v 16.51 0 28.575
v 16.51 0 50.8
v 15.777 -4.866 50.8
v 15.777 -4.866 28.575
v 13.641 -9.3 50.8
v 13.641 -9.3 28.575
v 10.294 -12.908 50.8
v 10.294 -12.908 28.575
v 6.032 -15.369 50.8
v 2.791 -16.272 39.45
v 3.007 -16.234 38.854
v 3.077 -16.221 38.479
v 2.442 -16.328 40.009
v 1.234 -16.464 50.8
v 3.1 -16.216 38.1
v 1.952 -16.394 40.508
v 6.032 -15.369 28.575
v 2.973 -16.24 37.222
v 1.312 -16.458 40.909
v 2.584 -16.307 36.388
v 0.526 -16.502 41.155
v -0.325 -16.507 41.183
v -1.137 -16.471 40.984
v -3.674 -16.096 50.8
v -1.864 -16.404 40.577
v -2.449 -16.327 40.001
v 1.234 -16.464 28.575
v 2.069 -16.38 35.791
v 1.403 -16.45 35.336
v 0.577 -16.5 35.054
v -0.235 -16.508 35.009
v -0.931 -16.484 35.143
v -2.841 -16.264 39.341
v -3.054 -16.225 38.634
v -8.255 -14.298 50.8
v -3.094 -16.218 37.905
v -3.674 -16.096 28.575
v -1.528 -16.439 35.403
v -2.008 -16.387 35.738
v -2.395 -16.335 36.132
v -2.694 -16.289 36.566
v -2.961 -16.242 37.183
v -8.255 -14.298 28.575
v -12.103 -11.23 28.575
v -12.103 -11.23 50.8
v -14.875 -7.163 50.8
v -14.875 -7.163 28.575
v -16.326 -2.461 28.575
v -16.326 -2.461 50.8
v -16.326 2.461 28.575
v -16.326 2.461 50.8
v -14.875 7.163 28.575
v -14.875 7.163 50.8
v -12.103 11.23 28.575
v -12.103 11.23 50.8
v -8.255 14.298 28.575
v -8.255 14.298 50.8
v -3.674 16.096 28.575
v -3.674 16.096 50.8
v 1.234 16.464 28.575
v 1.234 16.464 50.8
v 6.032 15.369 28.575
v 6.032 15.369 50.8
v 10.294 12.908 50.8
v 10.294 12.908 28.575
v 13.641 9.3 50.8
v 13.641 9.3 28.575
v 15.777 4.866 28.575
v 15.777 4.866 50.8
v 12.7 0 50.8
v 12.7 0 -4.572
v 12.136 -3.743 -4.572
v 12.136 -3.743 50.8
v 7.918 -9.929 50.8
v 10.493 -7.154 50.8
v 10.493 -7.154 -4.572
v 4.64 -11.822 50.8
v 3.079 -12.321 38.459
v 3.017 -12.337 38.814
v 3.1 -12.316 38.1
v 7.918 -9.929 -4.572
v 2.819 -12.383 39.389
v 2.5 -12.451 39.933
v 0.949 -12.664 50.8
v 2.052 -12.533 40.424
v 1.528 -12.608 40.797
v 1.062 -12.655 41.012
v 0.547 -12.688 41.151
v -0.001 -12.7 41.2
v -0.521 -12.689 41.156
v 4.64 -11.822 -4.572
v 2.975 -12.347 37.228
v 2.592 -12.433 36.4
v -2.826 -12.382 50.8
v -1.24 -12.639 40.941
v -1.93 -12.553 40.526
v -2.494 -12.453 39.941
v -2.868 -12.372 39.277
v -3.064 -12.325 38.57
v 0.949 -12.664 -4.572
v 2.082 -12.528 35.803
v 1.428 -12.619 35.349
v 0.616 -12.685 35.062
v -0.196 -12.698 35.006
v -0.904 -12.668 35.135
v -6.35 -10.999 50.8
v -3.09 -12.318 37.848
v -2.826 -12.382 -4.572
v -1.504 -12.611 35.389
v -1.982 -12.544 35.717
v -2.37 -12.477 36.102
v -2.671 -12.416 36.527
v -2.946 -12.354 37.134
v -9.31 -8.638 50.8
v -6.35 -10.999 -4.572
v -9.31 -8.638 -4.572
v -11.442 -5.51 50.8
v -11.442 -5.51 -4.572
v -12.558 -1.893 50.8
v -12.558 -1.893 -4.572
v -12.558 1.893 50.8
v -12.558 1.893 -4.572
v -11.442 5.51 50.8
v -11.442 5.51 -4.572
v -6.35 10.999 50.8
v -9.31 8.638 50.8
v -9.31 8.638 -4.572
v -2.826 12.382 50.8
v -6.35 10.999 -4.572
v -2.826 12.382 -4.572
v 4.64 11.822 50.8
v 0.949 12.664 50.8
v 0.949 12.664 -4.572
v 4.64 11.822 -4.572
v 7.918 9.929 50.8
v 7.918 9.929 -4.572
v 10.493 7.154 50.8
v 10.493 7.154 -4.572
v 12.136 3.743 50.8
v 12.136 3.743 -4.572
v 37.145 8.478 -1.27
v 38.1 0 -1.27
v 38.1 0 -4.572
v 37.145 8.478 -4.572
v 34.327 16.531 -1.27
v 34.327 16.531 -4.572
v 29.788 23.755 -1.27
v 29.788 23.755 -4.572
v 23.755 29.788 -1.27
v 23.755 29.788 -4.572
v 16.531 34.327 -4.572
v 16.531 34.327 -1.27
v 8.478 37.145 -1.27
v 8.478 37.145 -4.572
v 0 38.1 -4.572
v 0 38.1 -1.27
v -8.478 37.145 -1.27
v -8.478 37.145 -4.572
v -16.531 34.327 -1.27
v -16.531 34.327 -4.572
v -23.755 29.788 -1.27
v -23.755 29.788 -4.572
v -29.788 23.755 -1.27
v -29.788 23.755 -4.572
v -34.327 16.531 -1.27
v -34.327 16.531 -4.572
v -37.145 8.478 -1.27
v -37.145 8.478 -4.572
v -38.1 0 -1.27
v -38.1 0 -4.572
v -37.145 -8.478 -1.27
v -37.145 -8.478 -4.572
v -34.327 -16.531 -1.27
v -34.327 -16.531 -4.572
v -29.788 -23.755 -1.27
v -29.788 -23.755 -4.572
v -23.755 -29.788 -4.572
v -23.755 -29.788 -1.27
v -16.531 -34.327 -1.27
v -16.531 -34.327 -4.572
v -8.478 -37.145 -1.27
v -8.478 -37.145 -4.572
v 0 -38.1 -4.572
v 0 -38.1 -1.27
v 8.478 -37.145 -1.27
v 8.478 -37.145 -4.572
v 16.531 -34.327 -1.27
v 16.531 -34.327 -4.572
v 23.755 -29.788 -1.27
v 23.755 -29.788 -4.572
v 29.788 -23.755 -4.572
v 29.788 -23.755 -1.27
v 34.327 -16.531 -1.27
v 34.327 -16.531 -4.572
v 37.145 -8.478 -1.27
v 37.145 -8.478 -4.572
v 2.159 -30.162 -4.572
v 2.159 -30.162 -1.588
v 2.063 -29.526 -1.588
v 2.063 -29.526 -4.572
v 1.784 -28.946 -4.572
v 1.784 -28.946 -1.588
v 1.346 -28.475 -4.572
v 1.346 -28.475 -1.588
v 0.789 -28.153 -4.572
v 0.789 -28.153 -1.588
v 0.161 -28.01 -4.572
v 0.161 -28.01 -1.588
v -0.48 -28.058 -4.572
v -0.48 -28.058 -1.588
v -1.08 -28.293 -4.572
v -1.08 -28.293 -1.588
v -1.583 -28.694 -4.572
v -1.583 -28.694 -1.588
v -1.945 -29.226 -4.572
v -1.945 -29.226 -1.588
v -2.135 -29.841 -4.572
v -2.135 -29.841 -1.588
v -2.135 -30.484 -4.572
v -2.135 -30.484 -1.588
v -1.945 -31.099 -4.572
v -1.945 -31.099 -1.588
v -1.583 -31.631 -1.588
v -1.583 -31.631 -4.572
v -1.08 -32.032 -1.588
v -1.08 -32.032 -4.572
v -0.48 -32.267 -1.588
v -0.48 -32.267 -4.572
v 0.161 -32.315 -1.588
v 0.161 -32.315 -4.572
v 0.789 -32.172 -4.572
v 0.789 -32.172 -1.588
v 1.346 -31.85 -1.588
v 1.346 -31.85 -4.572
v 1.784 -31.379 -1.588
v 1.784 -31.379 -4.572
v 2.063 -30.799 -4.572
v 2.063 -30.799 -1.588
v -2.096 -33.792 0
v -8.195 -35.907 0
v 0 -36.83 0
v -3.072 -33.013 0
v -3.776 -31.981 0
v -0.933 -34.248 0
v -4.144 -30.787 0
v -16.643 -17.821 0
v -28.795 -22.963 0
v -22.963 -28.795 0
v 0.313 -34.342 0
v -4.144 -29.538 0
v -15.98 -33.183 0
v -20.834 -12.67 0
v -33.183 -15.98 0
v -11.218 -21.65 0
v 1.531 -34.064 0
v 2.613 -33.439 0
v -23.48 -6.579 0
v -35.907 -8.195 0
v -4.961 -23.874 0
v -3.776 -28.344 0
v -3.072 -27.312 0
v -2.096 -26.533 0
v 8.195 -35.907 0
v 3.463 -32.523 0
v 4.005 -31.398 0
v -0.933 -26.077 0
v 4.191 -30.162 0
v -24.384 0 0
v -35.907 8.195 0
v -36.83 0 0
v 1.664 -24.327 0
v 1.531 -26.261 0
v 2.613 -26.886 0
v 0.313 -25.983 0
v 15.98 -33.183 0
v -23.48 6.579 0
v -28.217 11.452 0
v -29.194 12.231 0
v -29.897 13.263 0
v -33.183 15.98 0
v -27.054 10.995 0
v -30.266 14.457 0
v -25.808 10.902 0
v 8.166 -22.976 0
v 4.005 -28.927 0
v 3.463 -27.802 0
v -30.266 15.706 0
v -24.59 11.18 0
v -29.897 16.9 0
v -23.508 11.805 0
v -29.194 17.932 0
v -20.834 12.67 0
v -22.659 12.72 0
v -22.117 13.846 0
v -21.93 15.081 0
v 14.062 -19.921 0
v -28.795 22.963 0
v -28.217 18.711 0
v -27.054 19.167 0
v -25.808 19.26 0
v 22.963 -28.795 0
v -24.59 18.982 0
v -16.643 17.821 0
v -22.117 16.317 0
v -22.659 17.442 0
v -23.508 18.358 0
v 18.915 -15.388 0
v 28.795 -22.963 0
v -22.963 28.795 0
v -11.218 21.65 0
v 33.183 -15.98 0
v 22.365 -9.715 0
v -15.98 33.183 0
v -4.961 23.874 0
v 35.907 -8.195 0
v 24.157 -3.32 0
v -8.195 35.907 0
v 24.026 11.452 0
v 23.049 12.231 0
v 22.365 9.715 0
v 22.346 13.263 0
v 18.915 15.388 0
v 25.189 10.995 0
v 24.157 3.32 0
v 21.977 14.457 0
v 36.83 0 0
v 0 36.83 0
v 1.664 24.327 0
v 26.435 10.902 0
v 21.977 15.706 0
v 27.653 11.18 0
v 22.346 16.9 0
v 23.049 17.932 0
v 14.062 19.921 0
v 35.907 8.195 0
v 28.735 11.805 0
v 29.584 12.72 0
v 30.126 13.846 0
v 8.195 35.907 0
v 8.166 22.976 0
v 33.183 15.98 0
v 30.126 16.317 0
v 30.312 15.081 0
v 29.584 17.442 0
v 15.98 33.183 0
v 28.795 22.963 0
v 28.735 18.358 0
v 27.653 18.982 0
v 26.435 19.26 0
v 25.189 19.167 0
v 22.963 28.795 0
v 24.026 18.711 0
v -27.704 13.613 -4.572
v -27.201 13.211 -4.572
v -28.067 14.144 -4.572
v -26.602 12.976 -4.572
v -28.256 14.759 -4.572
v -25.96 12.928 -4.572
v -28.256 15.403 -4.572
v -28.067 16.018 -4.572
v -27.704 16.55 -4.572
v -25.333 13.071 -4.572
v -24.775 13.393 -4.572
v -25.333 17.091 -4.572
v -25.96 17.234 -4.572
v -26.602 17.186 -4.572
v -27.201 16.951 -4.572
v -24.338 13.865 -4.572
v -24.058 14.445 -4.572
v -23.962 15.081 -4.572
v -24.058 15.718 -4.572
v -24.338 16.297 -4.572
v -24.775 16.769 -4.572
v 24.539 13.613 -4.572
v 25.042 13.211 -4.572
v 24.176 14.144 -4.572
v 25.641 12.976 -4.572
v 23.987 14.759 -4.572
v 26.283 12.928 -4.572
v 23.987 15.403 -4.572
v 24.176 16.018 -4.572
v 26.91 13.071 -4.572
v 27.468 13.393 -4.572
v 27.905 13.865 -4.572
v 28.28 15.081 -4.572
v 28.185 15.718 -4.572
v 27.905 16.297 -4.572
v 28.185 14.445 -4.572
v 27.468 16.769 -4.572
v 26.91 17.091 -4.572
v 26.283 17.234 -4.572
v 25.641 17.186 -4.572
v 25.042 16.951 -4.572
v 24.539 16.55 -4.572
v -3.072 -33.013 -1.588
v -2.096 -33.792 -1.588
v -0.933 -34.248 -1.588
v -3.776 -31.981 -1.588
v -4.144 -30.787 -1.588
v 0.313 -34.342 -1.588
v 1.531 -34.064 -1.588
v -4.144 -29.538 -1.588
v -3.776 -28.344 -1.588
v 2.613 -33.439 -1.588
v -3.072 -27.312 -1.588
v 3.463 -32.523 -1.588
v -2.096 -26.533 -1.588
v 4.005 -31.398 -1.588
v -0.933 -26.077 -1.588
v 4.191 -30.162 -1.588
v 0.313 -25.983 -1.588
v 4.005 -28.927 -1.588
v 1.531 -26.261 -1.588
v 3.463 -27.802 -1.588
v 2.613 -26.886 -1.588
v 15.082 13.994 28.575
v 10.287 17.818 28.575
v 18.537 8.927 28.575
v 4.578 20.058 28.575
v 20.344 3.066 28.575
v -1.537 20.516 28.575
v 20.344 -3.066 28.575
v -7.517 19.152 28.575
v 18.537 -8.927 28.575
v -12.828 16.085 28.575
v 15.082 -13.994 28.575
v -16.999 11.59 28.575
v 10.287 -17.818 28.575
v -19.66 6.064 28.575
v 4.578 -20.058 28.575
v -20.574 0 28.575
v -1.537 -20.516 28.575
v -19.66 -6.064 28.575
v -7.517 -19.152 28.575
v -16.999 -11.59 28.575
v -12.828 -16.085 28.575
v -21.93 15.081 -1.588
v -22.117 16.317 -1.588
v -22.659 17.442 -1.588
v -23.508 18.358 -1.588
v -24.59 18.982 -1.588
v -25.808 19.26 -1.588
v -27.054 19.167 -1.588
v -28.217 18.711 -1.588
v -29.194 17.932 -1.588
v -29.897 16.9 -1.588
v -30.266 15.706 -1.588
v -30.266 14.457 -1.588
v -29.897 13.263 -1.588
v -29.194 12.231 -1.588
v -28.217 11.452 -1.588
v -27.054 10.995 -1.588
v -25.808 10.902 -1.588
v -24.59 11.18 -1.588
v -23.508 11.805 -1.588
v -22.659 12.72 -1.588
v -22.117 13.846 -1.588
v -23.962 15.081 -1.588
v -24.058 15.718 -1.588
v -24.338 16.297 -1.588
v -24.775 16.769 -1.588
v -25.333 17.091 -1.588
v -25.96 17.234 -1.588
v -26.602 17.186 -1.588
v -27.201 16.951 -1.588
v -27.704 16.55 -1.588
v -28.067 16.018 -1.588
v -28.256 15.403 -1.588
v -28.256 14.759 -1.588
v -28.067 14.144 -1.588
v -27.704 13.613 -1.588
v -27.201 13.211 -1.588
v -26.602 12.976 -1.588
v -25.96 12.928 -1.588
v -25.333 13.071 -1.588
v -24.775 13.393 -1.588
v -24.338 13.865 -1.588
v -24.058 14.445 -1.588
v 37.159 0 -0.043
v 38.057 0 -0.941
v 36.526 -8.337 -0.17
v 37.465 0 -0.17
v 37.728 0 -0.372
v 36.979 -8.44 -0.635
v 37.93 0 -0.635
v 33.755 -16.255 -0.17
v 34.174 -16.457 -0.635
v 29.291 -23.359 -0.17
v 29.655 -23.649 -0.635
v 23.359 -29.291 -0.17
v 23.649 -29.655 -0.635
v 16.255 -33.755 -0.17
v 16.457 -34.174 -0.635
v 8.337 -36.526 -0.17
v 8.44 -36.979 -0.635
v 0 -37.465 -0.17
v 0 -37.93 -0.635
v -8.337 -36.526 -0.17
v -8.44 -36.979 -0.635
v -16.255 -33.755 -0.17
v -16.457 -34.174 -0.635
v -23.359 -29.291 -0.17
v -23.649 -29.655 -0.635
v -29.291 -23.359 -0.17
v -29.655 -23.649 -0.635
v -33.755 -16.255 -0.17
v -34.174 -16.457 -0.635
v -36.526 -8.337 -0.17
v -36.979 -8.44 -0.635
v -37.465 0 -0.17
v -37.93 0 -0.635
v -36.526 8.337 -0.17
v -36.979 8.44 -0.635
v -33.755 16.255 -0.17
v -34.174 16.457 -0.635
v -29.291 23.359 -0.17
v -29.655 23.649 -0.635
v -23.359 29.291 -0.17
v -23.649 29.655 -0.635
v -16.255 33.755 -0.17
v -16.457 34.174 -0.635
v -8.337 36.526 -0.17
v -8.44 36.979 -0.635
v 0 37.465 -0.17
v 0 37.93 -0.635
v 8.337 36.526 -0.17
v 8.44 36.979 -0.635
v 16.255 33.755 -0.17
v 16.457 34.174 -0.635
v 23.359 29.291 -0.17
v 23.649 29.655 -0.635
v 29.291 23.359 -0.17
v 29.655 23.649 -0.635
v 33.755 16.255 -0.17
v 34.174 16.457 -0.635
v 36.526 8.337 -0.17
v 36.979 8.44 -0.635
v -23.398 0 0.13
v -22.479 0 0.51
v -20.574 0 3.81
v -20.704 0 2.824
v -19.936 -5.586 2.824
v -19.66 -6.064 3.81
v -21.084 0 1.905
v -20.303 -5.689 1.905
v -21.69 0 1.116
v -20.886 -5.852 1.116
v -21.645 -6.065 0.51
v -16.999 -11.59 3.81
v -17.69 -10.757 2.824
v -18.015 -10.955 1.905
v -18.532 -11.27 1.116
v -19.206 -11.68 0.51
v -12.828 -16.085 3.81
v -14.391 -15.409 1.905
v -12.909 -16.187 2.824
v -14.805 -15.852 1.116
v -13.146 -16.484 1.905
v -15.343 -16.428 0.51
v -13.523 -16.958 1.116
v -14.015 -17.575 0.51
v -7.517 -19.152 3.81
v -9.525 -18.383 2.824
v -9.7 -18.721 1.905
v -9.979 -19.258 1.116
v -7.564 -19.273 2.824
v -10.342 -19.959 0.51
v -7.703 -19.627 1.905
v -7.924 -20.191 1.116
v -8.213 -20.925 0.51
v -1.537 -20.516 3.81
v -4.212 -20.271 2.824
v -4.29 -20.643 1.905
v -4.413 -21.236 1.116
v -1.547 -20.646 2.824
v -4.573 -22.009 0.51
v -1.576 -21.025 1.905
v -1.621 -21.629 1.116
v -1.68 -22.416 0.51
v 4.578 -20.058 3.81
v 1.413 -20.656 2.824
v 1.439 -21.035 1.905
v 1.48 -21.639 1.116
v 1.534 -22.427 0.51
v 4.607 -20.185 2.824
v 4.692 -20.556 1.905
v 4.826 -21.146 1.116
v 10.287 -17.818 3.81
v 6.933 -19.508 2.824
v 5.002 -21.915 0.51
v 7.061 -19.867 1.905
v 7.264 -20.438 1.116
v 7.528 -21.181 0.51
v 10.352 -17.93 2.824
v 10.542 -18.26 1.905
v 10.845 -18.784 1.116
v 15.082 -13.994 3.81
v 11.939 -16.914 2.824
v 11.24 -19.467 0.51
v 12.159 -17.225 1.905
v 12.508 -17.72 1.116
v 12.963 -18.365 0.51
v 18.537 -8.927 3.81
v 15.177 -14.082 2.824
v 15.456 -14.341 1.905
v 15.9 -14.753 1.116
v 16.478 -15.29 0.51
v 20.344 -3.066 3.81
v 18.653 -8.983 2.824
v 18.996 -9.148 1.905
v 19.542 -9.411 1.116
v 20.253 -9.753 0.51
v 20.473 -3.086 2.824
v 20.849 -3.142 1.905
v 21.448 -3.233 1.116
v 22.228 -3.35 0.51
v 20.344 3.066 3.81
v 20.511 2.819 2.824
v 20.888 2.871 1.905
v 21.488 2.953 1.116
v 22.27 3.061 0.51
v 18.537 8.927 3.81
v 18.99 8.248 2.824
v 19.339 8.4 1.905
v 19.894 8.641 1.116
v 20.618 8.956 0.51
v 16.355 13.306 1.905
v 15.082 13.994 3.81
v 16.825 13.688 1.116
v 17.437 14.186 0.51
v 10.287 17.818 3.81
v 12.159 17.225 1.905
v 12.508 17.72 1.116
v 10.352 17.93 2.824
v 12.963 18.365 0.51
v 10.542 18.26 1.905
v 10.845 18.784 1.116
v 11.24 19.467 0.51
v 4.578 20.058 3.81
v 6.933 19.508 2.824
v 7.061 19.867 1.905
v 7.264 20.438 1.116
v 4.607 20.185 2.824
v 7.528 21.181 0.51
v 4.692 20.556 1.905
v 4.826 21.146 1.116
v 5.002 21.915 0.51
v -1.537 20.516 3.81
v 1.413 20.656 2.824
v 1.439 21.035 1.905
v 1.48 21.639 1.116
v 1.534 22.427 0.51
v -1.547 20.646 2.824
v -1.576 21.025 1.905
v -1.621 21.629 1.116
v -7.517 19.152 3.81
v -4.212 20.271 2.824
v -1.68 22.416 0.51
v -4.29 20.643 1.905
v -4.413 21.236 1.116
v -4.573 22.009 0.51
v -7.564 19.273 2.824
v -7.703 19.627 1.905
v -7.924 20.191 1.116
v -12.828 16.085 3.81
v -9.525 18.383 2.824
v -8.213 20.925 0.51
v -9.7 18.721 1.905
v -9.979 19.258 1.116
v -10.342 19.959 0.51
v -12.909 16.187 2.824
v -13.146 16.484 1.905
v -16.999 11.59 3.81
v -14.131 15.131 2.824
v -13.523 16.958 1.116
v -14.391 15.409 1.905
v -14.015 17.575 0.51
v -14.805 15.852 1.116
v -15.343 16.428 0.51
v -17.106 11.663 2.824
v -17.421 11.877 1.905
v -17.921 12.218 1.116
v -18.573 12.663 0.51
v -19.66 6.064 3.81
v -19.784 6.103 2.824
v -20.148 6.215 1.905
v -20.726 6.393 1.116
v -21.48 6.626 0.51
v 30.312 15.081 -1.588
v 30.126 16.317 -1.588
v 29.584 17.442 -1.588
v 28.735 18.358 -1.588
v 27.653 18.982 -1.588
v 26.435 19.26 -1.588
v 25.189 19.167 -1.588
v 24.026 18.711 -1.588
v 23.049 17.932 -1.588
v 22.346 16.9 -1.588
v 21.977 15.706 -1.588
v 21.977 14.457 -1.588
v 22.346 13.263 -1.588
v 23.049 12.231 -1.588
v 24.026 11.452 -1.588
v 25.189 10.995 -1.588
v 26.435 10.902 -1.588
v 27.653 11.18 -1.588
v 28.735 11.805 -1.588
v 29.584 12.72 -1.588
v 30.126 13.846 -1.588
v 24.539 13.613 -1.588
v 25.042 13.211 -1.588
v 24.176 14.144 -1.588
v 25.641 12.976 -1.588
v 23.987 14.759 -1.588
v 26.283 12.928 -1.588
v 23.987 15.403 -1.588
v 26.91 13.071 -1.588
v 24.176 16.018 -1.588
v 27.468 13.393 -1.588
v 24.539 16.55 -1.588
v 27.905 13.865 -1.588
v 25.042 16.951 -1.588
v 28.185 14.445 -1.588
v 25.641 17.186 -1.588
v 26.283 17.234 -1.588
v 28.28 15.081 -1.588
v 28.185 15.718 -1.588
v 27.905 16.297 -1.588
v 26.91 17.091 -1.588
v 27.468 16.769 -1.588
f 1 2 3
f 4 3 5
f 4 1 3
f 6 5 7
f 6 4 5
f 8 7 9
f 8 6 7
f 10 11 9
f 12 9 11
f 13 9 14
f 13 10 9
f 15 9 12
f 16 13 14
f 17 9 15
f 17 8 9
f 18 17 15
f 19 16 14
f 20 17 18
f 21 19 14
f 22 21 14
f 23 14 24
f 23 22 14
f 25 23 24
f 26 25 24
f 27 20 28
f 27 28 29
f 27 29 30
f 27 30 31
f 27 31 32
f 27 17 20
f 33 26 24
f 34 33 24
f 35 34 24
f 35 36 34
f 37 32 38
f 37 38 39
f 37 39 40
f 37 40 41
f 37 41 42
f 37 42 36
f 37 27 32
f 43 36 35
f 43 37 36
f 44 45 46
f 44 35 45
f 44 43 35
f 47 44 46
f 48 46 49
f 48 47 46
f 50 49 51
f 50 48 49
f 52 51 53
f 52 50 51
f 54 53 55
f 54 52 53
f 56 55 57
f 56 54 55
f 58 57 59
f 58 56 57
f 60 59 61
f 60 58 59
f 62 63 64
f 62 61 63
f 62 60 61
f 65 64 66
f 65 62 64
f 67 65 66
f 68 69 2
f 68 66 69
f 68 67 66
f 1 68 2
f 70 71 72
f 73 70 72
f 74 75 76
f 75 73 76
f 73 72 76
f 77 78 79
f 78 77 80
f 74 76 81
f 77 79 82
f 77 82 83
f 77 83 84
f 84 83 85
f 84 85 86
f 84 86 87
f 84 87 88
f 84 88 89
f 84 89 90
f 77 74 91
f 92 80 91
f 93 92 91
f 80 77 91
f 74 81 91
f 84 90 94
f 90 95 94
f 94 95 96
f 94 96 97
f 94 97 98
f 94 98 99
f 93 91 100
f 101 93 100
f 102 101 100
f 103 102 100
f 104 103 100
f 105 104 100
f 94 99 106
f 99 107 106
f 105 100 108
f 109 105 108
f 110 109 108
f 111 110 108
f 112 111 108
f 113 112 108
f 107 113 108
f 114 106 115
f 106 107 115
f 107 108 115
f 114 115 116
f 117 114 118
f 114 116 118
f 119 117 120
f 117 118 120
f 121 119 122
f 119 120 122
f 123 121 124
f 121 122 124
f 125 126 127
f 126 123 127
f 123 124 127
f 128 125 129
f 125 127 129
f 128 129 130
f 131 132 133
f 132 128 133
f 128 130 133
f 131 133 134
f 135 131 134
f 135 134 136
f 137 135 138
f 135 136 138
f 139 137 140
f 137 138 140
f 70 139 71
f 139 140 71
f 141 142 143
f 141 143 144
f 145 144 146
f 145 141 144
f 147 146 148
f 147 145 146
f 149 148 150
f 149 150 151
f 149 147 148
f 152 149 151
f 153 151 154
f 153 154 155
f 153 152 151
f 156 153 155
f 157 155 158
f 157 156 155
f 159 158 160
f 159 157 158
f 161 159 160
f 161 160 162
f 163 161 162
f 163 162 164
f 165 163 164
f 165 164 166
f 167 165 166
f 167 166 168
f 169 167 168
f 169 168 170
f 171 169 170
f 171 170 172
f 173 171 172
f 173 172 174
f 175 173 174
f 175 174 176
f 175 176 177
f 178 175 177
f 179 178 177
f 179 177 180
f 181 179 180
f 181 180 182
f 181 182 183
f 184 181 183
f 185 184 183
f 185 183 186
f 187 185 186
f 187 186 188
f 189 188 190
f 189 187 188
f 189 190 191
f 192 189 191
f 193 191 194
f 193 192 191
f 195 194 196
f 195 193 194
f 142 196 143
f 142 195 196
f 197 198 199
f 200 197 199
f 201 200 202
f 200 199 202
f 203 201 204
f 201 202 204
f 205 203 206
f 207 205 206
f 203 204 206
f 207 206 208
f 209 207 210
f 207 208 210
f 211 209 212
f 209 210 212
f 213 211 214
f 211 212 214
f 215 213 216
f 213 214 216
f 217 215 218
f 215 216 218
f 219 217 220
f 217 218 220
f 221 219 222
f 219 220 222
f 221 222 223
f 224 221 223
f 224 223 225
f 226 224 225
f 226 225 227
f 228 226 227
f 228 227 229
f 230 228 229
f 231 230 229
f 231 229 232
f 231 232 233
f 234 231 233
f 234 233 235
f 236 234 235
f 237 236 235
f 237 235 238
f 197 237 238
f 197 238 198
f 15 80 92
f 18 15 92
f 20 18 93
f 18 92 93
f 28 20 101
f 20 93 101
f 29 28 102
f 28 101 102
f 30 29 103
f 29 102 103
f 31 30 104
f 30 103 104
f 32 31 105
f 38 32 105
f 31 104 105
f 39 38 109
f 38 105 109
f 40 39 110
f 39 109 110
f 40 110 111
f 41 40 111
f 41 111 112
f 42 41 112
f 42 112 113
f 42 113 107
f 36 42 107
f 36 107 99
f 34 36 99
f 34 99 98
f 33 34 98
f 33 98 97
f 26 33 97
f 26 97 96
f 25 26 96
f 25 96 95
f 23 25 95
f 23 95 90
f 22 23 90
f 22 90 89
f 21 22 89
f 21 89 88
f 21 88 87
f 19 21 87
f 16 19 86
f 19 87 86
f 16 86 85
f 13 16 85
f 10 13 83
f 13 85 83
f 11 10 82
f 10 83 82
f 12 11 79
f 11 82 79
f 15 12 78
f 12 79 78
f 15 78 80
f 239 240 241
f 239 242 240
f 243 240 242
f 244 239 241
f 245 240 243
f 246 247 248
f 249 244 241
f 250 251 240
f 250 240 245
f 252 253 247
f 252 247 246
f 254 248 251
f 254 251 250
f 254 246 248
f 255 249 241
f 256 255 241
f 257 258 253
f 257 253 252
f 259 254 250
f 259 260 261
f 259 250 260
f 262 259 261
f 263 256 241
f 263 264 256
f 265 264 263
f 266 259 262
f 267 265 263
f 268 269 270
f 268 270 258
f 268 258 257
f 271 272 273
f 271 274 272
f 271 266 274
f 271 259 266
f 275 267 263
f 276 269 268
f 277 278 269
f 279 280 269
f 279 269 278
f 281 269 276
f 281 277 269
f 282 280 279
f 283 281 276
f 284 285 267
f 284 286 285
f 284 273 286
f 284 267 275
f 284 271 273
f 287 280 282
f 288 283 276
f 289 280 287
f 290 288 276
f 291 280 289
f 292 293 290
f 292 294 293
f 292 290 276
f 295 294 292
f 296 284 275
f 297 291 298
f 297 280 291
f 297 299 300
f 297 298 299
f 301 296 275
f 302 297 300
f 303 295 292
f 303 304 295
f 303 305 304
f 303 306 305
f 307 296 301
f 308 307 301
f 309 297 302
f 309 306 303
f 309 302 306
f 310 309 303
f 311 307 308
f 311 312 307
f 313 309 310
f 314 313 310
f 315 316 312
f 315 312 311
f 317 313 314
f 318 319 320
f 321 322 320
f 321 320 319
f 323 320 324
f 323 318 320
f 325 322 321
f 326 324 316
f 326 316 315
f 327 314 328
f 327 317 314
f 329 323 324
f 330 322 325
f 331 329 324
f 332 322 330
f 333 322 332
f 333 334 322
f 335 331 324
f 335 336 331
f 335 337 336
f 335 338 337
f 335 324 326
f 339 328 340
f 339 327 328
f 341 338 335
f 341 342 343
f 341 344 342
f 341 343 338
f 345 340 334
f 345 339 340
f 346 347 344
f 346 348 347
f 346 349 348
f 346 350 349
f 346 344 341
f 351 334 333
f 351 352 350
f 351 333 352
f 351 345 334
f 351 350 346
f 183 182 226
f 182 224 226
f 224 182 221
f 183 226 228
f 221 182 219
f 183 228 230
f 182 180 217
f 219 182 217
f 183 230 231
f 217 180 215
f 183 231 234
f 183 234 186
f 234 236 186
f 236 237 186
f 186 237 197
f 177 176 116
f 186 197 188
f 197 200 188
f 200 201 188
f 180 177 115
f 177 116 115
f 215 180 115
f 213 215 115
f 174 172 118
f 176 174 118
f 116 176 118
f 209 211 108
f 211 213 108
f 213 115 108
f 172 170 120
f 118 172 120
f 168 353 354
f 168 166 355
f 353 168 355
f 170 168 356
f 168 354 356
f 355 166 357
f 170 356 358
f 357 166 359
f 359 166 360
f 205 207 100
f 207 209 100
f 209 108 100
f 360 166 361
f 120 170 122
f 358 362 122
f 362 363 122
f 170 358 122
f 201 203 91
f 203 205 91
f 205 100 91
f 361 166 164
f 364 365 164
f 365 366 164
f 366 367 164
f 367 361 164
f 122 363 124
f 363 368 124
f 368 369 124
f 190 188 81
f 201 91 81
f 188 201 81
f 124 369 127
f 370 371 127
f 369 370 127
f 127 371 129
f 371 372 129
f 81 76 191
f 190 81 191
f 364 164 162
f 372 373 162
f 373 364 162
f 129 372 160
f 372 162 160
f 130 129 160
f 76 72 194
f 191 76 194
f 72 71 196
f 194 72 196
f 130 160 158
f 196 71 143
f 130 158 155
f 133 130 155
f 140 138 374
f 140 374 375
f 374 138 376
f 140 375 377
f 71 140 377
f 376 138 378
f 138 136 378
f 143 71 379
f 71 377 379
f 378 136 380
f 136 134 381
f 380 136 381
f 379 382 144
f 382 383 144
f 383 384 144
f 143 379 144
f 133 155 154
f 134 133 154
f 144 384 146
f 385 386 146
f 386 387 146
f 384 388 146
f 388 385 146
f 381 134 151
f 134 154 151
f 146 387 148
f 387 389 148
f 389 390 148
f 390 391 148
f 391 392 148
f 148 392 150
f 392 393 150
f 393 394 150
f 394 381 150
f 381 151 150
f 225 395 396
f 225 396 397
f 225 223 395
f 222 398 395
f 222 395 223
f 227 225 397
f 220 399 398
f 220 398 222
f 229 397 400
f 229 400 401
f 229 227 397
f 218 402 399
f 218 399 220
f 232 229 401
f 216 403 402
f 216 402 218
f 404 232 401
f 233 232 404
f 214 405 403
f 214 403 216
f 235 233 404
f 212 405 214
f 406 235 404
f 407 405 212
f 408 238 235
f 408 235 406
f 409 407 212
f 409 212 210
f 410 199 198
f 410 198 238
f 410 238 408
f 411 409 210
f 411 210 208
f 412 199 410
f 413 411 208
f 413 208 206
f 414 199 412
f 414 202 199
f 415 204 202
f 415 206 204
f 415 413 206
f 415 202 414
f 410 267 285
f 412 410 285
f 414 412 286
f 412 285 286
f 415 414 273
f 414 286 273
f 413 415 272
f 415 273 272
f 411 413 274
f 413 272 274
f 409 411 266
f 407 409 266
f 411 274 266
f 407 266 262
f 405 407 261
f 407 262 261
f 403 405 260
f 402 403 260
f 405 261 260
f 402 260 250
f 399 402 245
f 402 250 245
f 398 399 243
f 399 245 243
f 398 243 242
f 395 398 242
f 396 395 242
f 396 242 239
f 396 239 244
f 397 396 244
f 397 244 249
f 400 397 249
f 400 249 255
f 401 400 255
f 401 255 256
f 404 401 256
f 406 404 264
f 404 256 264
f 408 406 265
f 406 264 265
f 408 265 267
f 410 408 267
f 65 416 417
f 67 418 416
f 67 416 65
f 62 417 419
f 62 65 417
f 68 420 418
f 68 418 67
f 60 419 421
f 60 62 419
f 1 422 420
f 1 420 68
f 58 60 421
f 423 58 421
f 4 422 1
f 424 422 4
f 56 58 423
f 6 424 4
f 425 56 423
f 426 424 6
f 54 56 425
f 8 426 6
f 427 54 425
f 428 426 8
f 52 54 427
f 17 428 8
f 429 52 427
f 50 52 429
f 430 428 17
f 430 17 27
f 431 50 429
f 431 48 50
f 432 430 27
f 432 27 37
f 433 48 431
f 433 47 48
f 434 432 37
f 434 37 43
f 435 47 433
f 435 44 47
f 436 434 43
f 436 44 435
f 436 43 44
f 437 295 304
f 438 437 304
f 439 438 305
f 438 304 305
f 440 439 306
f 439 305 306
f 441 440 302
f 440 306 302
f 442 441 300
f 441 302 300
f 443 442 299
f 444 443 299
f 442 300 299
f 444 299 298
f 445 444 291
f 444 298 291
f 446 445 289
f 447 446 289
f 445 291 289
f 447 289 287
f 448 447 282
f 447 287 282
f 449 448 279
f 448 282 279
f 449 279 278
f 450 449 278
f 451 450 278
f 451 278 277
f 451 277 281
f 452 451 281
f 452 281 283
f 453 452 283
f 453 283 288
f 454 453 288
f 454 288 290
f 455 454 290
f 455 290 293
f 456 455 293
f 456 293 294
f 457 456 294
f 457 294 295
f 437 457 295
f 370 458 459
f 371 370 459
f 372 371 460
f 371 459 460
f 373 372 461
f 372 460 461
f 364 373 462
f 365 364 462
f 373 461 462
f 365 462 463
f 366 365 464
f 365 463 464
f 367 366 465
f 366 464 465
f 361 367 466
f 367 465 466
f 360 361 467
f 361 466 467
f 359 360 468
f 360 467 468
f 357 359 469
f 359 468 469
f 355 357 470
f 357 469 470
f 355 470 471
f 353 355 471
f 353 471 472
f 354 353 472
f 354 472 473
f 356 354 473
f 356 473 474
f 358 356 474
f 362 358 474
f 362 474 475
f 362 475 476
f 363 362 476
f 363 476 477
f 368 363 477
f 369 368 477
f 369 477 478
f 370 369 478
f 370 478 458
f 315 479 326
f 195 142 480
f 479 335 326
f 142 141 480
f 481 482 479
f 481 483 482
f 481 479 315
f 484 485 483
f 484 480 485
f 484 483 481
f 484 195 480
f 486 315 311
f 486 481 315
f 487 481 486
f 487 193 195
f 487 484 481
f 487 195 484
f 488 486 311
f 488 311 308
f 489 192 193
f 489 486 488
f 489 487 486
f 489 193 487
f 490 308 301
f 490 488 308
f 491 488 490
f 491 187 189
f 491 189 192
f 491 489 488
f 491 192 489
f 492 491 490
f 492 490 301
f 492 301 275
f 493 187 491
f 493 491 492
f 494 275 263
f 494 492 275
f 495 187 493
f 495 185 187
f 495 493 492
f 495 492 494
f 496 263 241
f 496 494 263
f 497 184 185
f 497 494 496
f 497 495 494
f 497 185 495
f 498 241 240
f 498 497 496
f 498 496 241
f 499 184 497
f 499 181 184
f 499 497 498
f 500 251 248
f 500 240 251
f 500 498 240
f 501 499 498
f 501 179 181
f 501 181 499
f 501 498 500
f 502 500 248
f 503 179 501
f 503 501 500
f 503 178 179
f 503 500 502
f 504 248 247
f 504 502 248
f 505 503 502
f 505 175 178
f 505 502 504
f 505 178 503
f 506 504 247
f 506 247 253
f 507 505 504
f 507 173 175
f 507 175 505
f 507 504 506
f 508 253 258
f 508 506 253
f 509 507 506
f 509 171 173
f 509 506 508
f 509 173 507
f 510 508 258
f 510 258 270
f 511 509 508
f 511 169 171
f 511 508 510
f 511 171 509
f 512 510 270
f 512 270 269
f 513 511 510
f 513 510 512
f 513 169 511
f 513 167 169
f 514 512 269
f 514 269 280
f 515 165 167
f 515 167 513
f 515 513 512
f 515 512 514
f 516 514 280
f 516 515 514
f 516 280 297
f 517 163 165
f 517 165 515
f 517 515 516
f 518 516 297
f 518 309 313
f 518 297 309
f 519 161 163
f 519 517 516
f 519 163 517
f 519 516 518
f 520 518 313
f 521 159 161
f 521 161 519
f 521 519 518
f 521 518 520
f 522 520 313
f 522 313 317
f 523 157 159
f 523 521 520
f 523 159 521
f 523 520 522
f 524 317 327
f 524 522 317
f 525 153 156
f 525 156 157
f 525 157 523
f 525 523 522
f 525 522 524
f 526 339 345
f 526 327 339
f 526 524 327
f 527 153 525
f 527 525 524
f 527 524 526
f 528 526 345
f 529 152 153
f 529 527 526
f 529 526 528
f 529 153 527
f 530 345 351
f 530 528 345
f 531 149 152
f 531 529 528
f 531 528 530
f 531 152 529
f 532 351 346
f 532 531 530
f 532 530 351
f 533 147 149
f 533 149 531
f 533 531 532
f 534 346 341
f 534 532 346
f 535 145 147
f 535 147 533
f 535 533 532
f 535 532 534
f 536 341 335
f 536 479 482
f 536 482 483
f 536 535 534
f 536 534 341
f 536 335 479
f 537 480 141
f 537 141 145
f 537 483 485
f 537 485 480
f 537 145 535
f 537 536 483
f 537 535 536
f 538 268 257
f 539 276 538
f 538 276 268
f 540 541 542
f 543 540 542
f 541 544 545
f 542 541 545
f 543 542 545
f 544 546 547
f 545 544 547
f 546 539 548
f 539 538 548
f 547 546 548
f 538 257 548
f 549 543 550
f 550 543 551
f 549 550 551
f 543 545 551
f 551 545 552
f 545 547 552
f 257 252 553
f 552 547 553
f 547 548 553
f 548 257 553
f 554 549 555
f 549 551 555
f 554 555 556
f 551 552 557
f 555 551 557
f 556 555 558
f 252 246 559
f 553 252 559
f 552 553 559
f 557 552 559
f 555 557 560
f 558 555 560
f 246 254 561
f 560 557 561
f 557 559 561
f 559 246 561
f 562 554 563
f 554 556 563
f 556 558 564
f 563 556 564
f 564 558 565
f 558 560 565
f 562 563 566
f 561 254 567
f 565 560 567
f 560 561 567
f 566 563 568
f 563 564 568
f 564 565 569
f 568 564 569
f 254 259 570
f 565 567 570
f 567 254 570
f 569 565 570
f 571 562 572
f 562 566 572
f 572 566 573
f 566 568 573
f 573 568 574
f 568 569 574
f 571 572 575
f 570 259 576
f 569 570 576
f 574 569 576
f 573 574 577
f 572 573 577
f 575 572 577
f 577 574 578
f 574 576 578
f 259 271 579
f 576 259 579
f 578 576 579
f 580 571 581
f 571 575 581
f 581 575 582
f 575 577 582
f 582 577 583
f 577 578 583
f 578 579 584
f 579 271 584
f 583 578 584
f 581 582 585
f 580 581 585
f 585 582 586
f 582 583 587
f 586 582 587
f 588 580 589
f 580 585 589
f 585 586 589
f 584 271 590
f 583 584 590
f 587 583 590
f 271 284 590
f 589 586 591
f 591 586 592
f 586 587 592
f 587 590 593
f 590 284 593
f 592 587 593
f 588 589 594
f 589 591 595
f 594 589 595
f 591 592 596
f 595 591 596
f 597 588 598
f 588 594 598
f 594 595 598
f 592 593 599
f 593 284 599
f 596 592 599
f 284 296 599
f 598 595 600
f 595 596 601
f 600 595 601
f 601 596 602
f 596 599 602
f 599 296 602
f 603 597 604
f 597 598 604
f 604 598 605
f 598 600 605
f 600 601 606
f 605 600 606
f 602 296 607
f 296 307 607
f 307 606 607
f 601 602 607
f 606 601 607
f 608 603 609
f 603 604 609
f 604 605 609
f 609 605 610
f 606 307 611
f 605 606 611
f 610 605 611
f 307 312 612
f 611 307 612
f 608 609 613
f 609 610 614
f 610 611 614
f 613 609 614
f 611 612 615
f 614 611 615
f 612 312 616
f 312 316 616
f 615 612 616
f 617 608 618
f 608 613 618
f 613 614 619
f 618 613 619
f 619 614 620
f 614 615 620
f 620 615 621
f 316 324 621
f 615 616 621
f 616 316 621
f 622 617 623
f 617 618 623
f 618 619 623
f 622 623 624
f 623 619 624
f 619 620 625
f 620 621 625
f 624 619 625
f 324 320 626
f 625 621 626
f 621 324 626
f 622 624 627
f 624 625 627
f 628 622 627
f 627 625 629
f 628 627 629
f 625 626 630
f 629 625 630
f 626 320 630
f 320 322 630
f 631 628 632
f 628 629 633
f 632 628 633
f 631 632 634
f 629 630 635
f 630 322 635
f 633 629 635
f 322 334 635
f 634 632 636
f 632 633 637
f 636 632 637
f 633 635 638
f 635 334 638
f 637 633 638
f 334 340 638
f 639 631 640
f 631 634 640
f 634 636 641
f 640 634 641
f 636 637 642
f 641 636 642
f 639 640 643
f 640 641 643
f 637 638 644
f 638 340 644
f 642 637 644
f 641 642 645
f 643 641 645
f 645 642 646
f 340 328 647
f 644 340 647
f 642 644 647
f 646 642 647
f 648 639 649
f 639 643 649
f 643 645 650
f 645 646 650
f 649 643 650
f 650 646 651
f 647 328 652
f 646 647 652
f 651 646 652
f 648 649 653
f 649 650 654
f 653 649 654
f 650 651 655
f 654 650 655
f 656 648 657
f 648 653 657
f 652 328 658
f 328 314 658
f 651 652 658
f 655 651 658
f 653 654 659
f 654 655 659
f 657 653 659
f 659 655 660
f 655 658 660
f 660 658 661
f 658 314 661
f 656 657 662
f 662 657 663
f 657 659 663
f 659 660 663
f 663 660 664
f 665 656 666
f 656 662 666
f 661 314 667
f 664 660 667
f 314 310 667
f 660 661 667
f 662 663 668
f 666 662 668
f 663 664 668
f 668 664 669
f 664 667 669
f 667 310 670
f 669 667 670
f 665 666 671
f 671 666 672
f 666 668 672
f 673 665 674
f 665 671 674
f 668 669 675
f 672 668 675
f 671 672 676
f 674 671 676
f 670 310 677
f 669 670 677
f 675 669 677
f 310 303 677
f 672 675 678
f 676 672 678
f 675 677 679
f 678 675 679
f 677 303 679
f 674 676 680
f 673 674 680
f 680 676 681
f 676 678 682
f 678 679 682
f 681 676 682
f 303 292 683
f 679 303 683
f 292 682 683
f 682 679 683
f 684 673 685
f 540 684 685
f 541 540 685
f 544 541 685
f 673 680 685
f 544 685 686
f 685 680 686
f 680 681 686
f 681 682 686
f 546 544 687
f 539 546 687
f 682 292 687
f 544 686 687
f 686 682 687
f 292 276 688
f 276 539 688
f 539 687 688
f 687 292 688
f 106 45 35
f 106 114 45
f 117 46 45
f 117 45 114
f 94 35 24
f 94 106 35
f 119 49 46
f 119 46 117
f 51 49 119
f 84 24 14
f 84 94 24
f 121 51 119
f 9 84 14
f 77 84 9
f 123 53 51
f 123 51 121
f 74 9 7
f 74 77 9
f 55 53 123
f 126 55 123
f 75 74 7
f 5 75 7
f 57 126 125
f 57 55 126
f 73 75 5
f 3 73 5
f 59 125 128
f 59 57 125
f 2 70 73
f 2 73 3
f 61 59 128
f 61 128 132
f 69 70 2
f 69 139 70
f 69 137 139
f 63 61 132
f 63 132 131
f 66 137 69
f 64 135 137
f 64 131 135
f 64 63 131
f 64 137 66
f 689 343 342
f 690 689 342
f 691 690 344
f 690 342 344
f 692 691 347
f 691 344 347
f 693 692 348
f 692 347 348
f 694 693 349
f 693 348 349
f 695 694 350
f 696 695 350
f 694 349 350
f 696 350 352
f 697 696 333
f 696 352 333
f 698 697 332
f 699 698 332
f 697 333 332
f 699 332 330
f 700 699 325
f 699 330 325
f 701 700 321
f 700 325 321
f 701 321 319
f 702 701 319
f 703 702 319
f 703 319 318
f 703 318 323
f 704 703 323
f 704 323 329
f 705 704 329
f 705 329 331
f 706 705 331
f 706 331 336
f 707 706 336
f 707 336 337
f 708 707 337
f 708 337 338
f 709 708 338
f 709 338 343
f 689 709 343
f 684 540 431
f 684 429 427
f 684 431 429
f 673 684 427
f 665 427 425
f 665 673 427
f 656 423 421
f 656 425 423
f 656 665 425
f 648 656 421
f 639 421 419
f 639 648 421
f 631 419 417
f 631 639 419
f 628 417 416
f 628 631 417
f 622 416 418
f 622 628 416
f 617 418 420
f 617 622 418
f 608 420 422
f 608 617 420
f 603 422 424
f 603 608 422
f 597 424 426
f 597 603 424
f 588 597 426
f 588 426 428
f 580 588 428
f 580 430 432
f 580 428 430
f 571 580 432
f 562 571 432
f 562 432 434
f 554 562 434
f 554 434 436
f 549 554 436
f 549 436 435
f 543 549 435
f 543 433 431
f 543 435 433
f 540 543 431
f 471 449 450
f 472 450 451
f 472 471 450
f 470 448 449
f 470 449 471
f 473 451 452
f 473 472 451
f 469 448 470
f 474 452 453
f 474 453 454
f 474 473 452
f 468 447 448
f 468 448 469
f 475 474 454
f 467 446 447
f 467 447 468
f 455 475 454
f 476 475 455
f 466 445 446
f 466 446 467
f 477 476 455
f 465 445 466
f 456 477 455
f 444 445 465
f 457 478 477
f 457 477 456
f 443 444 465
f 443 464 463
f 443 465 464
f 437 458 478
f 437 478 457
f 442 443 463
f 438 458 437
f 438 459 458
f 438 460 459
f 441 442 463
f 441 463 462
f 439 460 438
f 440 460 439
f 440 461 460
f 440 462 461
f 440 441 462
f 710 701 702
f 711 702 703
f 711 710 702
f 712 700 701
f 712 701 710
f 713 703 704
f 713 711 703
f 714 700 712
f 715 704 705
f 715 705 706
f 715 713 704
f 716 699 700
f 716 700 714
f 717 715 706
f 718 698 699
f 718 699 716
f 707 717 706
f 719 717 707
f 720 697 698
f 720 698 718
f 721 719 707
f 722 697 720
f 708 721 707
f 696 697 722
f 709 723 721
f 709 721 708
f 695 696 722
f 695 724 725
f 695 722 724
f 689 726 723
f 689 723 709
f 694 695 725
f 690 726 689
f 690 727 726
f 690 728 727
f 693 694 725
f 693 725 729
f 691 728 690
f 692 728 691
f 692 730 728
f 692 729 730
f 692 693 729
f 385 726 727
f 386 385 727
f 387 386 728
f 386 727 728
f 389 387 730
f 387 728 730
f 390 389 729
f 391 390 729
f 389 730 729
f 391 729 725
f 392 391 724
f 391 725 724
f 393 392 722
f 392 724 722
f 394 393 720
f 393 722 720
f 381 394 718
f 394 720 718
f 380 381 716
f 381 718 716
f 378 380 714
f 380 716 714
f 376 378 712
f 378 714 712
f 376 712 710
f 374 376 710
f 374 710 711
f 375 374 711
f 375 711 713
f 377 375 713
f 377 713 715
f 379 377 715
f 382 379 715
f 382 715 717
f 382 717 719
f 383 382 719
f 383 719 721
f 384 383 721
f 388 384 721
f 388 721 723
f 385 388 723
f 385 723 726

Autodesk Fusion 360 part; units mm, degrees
sketch "Sketch1" plane through (0, 0, 0) normal (0, 0, 1) x (1, 0, 0)
  circle A0 centre (0, 0) radius 16.51
  circle A1 centre (0, 0) radius 12.7
  circle A2 centre (0, 0) radius 38.1
  dimension "d1" = 33.02
  dimension "d2" = 25.4
  dimension "d3" = 76.2
extrude "Extrude1" add sketch "Sketch1" along normal blind 50.8 contours A0
extrude "Extrude2" add sketch "Sketch1" against normal blind 4.572 contours A0 | A2
sketch "Sketch3" plane through (0, 0, 0) normal (0, 0, 1) x (1, 0, 0)
  line L0 (0, 0) -> (0, -39.9504) construction
  line L1 (0, 0) -> (-48.5556, 28.0336) construction
  line L2 (0, 0) -> (38.9341, 22.4786) construction
  circle A0 centre (0, 0) radius 30.1625 construction
  circle A1 centre (0, -30.1625) radius 2.159
  circle A2 centre (-26.1215, 15.0812) radius 2.159
  circle A3 centre (26.1215, 15.0812) radius 2.159
  circle A4 centre (0, -30.1625) radius 4.191
  circle A5 centre (-26.1215, 15.0812) radius 4.191
  circle A6 centre (26.1215, 15.0812) radius 4.191
  dimension "d8" = 120
  dimension "d9" = 120
  dimension "d10" = 60.325
  dimension "d11" = 4.318
  dimension "d12" = 8.382
extrude "Extrude3" cut sketch "Sketch3" against normal up to surface (4.572 mm away) contours A1 | A2 | A3
extrude "Extrude4" cut sketch "Sketch3" against normal blind 1.5875
sketch "Sketch4" plane through (0, 0, 0) normal (0, 1, 0) x (1, 0, 0)
  line L0 (0, 0) -> (0, -68.6315) construction
  circle A0 centre (0, -38.1) radius 3.1
  line L1 (0, 0) -> (-36.56, 0) construction
  line L2 (-16.51, -50.8) -> (16.51, -50.8) construction
  dimension "d17" = 6.2
  dimension "d19" = 12.7
extrude "Extrude5" cut sketch "Sketch4" against normal blind 28.9814
sketch "Sketch5" plane through (0, 0, 0) normal (0, 0, 1) x (-1, 0, 0)
  circle A0 centre (-26.1215, -15.0812) radius 4.191
  circle A1 centre (26.1215, -15.0812) radius 4.191
  circle A2 centre (0, 30.1625) radius 4.191
  circle A3 centre (0, 0) radius 38.1
  circle A4 centre (0, 0) radius 16.51
  circle A5 centre (0, 0) radius 16.51
  circle A6 centre (0, 0) radius 20.574
  dimension "d22" = 41.148
extrude "Extrude6" add sketch "Sketch5" along normal blind 28.575 contours A6
fillet "Fillet1" radius 3.81 1 edges at (19.1817, -7.4399, 0)
fillet "Fillet2" radius 1.27 1 edges at (-35.5217, -13.7775, 0)
